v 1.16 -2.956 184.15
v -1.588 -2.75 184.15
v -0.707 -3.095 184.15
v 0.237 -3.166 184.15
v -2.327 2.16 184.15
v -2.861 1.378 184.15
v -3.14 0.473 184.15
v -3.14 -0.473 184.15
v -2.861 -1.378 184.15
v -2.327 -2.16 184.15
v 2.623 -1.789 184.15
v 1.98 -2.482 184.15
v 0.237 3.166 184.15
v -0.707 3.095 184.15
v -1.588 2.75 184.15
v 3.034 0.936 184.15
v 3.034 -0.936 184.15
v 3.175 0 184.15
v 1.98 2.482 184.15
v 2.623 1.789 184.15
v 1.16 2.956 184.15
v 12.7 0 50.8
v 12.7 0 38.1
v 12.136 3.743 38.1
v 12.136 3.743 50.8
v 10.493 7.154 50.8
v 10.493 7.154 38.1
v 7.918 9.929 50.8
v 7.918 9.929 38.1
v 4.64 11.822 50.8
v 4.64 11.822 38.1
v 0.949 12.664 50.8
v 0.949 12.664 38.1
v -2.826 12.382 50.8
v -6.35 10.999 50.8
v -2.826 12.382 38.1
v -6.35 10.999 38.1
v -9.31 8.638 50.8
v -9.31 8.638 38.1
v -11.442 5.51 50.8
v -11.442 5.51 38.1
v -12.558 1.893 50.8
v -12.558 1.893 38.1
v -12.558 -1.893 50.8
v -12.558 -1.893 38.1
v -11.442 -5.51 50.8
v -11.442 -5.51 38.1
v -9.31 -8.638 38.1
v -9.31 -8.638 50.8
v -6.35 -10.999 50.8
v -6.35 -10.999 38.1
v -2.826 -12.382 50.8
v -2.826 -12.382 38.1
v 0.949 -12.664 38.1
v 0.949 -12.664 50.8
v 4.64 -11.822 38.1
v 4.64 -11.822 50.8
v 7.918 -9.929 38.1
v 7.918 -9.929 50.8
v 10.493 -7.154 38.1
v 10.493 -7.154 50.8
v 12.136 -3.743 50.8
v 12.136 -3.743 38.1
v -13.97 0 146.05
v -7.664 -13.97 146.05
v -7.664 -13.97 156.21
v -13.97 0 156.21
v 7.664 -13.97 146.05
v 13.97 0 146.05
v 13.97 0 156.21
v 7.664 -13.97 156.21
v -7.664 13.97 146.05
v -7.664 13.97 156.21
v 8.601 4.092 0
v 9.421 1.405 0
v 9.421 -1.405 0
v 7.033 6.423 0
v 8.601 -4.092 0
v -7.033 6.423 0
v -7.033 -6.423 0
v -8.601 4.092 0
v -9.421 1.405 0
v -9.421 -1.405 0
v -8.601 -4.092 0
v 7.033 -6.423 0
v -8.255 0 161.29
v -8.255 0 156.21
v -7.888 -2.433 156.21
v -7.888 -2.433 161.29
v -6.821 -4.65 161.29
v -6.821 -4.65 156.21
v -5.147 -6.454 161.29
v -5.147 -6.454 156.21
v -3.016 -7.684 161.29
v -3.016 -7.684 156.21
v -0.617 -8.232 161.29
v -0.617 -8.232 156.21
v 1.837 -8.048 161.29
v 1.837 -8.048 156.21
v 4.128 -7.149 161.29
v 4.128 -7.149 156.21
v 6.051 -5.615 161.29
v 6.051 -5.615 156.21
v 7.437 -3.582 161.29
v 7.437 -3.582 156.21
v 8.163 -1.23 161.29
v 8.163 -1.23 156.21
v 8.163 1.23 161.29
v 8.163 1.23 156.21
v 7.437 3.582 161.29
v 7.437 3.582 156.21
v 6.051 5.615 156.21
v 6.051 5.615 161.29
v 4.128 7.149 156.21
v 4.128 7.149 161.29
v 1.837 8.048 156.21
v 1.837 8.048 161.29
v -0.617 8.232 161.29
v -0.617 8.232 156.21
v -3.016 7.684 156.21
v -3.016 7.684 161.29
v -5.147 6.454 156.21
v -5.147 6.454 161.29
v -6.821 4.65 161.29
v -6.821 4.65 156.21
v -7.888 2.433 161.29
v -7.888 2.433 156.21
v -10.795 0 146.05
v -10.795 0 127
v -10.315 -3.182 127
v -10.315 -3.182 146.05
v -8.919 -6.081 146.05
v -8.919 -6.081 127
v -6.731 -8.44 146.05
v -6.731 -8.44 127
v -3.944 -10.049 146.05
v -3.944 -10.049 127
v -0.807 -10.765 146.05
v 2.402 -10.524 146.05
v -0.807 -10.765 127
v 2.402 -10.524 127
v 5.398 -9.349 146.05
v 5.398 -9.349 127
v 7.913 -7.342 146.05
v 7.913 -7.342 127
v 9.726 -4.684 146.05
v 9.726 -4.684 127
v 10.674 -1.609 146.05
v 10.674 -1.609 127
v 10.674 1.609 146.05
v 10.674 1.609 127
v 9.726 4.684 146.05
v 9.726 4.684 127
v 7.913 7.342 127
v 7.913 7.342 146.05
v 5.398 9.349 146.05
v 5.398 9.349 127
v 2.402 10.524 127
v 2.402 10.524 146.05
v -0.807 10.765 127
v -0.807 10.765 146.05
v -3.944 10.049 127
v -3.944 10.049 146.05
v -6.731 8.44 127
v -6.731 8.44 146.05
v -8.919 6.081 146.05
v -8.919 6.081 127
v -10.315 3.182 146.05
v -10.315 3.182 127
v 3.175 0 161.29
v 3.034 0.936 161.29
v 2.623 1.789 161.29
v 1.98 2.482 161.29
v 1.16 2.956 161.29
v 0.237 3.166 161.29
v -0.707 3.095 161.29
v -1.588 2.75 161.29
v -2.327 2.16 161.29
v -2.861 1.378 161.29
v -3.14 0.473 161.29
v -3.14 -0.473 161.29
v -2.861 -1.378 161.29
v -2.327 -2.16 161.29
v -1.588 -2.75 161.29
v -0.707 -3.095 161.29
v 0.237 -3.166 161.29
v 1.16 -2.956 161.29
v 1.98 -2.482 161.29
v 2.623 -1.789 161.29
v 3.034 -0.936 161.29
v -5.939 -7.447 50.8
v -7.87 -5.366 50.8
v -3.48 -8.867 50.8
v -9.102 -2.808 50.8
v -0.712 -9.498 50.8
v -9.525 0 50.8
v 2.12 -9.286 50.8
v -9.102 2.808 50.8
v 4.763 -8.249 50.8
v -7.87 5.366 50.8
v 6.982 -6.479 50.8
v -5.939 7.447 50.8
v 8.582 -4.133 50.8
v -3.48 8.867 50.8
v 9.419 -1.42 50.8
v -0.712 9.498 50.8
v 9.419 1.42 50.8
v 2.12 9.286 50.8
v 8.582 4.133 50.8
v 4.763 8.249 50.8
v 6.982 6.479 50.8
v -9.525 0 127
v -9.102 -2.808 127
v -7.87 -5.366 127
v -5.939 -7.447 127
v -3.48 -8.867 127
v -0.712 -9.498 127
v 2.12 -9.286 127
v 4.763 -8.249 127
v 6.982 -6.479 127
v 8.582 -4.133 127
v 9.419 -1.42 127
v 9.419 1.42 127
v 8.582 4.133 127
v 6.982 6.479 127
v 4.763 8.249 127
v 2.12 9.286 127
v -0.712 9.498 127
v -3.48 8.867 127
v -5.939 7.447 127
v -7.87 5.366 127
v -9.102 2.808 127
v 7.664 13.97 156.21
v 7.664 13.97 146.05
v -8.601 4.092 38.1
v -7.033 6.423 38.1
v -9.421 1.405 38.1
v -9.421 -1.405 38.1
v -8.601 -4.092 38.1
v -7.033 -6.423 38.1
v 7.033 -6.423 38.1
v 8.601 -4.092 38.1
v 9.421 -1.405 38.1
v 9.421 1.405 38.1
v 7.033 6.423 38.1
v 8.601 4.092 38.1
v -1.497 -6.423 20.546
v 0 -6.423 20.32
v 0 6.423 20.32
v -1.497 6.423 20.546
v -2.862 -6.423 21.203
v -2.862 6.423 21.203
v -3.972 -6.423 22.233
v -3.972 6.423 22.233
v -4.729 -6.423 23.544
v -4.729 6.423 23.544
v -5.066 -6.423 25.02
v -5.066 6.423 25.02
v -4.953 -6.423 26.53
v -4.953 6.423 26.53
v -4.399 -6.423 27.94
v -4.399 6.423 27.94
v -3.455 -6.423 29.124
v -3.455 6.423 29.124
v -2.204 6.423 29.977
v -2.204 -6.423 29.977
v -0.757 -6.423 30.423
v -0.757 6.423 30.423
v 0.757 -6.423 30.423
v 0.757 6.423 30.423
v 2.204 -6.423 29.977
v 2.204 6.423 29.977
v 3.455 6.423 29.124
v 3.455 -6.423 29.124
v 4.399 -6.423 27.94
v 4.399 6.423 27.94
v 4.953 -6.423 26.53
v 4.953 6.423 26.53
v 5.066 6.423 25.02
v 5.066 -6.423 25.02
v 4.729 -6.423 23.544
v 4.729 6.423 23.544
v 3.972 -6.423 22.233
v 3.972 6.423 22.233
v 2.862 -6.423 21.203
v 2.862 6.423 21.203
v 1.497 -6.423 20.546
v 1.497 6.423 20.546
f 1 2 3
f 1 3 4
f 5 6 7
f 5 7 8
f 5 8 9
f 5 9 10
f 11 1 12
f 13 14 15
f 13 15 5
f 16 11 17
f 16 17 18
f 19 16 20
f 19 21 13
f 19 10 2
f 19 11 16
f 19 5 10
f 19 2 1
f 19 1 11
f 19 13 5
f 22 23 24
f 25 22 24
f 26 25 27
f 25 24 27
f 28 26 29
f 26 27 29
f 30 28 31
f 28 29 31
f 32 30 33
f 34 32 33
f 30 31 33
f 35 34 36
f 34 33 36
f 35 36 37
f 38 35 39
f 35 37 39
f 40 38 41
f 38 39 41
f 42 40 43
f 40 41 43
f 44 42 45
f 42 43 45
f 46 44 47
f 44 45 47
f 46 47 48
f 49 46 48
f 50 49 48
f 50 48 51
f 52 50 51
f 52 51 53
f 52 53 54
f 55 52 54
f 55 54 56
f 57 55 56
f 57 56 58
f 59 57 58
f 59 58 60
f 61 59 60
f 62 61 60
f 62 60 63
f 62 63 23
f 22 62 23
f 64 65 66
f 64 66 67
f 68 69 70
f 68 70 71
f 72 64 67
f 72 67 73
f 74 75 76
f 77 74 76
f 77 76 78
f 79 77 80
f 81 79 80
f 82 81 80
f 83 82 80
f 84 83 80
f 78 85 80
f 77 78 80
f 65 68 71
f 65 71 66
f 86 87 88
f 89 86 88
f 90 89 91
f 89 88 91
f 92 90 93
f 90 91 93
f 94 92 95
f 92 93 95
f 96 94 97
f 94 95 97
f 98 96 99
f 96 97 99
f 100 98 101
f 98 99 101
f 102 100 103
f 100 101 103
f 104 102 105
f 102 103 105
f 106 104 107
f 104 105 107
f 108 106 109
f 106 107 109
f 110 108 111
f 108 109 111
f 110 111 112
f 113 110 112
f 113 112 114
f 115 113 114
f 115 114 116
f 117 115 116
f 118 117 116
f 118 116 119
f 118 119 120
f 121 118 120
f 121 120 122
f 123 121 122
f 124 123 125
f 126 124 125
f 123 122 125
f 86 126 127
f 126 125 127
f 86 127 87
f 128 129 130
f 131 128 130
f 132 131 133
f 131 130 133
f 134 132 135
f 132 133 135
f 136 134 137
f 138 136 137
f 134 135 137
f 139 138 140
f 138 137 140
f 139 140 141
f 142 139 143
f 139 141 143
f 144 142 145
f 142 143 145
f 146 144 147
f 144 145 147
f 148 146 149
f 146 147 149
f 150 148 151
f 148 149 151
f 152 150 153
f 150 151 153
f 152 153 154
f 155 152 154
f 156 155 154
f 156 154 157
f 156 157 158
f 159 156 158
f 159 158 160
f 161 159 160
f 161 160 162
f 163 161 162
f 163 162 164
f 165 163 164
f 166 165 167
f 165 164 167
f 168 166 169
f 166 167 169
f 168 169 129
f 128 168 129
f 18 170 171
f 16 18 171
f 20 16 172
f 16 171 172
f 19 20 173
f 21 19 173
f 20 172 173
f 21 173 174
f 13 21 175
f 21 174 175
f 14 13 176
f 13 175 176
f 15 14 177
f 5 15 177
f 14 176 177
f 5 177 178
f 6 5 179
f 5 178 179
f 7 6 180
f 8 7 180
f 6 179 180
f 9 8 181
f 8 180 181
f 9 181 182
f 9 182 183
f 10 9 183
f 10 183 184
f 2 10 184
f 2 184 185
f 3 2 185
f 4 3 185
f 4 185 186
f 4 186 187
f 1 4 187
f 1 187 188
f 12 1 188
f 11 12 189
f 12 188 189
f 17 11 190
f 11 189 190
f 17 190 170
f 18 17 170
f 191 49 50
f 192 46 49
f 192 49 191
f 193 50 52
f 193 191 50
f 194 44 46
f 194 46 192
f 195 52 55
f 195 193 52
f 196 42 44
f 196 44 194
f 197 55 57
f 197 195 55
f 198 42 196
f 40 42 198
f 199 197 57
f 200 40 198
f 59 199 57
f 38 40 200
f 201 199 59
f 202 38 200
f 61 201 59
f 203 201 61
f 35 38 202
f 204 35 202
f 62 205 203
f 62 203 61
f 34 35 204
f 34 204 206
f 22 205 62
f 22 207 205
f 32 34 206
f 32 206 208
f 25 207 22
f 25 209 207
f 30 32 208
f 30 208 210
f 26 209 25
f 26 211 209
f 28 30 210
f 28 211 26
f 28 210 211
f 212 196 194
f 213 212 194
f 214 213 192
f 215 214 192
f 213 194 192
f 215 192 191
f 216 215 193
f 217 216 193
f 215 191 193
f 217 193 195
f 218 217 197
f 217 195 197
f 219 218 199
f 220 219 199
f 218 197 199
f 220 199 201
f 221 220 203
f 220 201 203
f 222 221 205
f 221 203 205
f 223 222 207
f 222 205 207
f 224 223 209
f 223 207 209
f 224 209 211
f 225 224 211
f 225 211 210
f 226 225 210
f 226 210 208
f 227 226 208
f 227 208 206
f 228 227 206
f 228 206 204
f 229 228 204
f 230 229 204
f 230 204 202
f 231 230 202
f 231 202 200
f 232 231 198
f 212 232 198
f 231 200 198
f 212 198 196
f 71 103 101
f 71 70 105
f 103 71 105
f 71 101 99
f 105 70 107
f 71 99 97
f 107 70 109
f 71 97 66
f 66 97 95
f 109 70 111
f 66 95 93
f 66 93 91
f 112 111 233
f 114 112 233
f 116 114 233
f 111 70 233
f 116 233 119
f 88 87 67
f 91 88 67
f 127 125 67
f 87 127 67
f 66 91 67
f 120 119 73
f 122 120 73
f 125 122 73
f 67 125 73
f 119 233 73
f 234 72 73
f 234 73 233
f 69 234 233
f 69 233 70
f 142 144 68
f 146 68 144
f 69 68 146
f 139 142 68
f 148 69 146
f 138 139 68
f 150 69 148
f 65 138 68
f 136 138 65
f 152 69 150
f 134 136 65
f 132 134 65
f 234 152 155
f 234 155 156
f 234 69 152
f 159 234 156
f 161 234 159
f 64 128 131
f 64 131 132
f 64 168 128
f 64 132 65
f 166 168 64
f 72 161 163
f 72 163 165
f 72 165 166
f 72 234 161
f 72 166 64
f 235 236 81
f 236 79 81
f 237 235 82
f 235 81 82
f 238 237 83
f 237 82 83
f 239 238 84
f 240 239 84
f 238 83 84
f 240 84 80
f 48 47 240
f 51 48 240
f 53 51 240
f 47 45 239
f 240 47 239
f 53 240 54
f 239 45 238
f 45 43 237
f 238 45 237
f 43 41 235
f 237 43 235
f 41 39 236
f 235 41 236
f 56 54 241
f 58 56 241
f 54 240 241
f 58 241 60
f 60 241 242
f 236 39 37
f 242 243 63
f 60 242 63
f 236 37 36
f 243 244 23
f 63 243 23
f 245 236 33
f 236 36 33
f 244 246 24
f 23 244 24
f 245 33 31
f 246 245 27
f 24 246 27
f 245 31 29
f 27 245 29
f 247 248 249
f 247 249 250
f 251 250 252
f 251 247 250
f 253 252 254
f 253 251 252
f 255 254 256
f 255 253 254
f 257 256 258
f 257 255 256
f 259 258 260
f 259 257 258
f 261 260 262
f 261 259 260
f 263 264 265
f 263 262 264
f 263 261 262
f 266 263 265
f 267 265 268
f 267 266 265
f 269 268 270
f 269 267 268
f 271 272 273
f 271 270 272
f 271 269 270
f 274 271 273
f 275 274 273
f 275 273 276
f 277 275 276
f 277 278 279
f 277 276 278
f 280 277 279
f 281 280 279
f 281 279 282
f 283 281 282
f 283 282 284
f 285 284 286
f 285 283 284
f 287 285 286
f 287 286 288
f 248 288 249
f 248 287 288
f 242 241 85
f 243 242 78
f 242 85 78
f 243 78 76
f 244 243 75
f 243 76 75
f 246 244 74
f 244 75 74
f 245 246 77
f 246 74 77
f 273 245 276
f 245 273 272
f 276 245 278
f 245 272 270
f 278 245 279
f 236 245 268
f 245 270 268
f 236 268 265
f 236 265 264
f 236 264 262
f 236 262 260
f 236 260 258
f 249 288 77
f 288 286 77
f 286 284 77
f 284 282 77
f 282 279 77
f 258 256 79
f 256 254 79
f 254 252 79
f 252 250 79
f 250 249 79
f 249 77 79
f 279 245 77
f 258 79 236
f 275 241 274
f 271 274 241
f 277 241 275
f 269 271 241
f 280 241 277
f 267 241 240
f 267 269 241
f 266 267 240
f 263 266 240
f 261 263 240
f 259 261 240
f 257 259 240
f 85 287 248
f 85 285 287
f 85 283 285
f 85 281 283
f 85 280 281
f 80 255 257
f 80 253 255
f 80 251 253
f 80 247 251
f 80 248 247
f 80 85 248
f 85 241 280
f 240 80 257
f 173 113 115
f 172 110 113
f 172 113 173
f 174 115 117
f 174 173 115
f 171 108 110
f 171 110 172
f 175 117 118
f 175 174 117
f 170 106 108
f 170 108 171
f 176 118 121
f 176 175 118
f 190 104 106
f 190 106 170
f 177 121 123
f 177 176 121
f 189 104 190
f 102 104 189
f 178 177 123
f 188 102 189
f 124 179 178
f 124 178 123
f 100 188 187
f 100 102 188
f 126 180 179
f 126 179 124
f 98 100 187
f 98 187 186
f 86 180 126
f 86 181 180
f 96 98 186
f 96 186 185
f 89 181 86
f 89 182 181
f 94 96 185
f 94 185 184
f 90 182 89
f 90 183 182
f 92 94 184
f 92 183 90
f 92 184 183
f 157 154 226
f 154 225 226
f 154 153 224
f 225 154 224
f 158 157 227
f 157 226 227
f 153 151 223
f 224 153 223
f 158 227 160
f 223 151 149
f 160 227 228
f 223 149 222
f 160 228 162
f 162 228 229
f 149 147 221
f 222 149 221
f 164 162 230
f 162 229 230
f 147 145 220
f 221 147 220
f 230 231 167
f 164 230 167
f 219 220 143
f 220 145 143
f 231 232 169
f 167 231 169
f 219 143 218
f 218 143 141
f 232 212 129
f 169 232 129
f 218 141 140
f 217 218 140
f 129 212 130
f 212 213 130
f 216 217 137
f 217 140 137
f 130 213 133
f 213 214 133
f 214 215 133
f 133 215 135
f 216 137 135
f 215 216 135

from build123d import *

# Parameters (mm, degrees)
SKETCH1_R               = 9.525
BOSS_EXTRUDE1_DEPTH     = 38.1
SKETCH2_R               = 12.7
BOSS_EXTRUDE2_DEPTH     = 12.7
SKETCH3_R               = 9.525
BOSS_EXTRUDE3_DEPTH     = 76.2
SKETCH4_R               = 10.795
BOSS_EXTRUDE4_DEPTH     = 19.05
BOSS_EXTRUDE5_DEPTH     = 10.16
SKETCH6_R               = 8.255
BOSS_EXTRUDE6_DEPTH     = 5.08
SKETCH7_R               = 3.175
BOSS_EXTRUDE7_DEPTH     = 22.86
CUT_EXTRUDE1_DEPTH      = 22.86
CUT_EXTRUDE1_DEPTH_BACK = 22.86
SKETCH8_R               = 5.08
SKETCH9_W               = 16.087027097
SKETCH9_H               = 5.943828254
CUT_EXTRUDE2_DEPTH      = 38.1


with BuildPart() as part:
    # Sketch1 → Boss-Extrude1 (new body)
    with BuildSketch(Plane.XY):
        with Locations(Location((0, 0, 0), (0, 0, 180))):
            Circle(SKETCH1_R)
    extrude(amount=BOSS_EXTRUDE1_DEPTH)

    # Sketch2 → Boss-Extrude2 (add)
    with BuildSketch(Plane.XY.offset(38.1)):
        Circle(SKETCH2_R)
    extrude(amount=BOSS_EXTRUDE2_DEPTH)

    # Sketch3 → Boss-Extrude3 (add)
    with BuildSketch(Plane.XY.offset(50.8)):
        with Locations(Location((0, 0, 0), (0, 0, 180))):
            Circle(SKETCH3_R)
    extrude(amount=BOSS_EXTRUDE3_DEPTH)

    # Sketch4 → Boss-Extrude4 (add)
    with BuildSketch(Plane.XY.offset(127)):
        with Locations(Location((0, 0, 0), (0, 0, 180))):
            Circle(SKETCH4_R)
    extrude(amount=BOSS_EXTRUDE4_DEPTH)

    # Sketch5 → Boss-Extrude5 (add)
    with BuildSketch(Plane.XY.offset(146.05)):
        Polygon((-7.663715272, 13.97), (7.663715272, 13.97), (13.97, 0), (7.663715272, -13.97), (-7.663715272, -13.97), (-13.97, 0), align=None)
    extrude(amount=BOSS_EXTRUDE5_DEPTH)

    # Sketch6 → Boss-Extrude6 (add)
    with BuildSketch(Plane.XY.offset(156.21)):
        with Locations(Location((0, 0, 0), (0, 0, 180))):
            Circle(SKETCH6_R)
    extrude(amount=BOSS_EXTRUDE6_DEPTH)

    # Sketch7 → Boss-Extrude7 (add)
    with BuildSketch(Plane.XY.offset(161.29)):
        Circle(SKETCH7_R)
    extrude(amount=BOSS_EXTRUDE7_DEPTH)

    # Sketch8 → Cut-Extrude1 (cut, two sides: drawn at the far end of the back side and taken through both)
    with BuildSketch(Plane(origin=(0, 0, 0), x_dir=(1, 0, 0), z_dir=(0, 1, 0)).offset(-CUT_EXTRUDE1_DEPTH_BACK)):
        with Locations(Location((0, -25.4, 0), (0, 0, 90))):
            Circle(SKETCH8_R)
    extrude(amount=CUT_EXTRUDE1_DEPTH + CUT_EXTRUDE1_DEPTH_BACK, mode=Mode.SUBTRACT)

    # Sketch9 → Cut-Extrude2 (cut)
    with BuildSketch(Plane(origin=(0, 0, 0), x_dir=(-1, 0, 0), z_dir=(0, 0, -1))):
        with Locations((1.010043222, 9.394991284)):
            Rectangle(SKETCH9_W, SKETCH9_H)
    cut_extrude2 = extrude(amount=-CUT_EXTRUDE2_DEPTH, mode=Mode.SUBTRACT)

    # Mirror1: Cut-Extrude2 across plane
    add(cut_extrude2.mirror(Plane.ZX), mode=Mode.SUBTRACT)


solid = part.part
